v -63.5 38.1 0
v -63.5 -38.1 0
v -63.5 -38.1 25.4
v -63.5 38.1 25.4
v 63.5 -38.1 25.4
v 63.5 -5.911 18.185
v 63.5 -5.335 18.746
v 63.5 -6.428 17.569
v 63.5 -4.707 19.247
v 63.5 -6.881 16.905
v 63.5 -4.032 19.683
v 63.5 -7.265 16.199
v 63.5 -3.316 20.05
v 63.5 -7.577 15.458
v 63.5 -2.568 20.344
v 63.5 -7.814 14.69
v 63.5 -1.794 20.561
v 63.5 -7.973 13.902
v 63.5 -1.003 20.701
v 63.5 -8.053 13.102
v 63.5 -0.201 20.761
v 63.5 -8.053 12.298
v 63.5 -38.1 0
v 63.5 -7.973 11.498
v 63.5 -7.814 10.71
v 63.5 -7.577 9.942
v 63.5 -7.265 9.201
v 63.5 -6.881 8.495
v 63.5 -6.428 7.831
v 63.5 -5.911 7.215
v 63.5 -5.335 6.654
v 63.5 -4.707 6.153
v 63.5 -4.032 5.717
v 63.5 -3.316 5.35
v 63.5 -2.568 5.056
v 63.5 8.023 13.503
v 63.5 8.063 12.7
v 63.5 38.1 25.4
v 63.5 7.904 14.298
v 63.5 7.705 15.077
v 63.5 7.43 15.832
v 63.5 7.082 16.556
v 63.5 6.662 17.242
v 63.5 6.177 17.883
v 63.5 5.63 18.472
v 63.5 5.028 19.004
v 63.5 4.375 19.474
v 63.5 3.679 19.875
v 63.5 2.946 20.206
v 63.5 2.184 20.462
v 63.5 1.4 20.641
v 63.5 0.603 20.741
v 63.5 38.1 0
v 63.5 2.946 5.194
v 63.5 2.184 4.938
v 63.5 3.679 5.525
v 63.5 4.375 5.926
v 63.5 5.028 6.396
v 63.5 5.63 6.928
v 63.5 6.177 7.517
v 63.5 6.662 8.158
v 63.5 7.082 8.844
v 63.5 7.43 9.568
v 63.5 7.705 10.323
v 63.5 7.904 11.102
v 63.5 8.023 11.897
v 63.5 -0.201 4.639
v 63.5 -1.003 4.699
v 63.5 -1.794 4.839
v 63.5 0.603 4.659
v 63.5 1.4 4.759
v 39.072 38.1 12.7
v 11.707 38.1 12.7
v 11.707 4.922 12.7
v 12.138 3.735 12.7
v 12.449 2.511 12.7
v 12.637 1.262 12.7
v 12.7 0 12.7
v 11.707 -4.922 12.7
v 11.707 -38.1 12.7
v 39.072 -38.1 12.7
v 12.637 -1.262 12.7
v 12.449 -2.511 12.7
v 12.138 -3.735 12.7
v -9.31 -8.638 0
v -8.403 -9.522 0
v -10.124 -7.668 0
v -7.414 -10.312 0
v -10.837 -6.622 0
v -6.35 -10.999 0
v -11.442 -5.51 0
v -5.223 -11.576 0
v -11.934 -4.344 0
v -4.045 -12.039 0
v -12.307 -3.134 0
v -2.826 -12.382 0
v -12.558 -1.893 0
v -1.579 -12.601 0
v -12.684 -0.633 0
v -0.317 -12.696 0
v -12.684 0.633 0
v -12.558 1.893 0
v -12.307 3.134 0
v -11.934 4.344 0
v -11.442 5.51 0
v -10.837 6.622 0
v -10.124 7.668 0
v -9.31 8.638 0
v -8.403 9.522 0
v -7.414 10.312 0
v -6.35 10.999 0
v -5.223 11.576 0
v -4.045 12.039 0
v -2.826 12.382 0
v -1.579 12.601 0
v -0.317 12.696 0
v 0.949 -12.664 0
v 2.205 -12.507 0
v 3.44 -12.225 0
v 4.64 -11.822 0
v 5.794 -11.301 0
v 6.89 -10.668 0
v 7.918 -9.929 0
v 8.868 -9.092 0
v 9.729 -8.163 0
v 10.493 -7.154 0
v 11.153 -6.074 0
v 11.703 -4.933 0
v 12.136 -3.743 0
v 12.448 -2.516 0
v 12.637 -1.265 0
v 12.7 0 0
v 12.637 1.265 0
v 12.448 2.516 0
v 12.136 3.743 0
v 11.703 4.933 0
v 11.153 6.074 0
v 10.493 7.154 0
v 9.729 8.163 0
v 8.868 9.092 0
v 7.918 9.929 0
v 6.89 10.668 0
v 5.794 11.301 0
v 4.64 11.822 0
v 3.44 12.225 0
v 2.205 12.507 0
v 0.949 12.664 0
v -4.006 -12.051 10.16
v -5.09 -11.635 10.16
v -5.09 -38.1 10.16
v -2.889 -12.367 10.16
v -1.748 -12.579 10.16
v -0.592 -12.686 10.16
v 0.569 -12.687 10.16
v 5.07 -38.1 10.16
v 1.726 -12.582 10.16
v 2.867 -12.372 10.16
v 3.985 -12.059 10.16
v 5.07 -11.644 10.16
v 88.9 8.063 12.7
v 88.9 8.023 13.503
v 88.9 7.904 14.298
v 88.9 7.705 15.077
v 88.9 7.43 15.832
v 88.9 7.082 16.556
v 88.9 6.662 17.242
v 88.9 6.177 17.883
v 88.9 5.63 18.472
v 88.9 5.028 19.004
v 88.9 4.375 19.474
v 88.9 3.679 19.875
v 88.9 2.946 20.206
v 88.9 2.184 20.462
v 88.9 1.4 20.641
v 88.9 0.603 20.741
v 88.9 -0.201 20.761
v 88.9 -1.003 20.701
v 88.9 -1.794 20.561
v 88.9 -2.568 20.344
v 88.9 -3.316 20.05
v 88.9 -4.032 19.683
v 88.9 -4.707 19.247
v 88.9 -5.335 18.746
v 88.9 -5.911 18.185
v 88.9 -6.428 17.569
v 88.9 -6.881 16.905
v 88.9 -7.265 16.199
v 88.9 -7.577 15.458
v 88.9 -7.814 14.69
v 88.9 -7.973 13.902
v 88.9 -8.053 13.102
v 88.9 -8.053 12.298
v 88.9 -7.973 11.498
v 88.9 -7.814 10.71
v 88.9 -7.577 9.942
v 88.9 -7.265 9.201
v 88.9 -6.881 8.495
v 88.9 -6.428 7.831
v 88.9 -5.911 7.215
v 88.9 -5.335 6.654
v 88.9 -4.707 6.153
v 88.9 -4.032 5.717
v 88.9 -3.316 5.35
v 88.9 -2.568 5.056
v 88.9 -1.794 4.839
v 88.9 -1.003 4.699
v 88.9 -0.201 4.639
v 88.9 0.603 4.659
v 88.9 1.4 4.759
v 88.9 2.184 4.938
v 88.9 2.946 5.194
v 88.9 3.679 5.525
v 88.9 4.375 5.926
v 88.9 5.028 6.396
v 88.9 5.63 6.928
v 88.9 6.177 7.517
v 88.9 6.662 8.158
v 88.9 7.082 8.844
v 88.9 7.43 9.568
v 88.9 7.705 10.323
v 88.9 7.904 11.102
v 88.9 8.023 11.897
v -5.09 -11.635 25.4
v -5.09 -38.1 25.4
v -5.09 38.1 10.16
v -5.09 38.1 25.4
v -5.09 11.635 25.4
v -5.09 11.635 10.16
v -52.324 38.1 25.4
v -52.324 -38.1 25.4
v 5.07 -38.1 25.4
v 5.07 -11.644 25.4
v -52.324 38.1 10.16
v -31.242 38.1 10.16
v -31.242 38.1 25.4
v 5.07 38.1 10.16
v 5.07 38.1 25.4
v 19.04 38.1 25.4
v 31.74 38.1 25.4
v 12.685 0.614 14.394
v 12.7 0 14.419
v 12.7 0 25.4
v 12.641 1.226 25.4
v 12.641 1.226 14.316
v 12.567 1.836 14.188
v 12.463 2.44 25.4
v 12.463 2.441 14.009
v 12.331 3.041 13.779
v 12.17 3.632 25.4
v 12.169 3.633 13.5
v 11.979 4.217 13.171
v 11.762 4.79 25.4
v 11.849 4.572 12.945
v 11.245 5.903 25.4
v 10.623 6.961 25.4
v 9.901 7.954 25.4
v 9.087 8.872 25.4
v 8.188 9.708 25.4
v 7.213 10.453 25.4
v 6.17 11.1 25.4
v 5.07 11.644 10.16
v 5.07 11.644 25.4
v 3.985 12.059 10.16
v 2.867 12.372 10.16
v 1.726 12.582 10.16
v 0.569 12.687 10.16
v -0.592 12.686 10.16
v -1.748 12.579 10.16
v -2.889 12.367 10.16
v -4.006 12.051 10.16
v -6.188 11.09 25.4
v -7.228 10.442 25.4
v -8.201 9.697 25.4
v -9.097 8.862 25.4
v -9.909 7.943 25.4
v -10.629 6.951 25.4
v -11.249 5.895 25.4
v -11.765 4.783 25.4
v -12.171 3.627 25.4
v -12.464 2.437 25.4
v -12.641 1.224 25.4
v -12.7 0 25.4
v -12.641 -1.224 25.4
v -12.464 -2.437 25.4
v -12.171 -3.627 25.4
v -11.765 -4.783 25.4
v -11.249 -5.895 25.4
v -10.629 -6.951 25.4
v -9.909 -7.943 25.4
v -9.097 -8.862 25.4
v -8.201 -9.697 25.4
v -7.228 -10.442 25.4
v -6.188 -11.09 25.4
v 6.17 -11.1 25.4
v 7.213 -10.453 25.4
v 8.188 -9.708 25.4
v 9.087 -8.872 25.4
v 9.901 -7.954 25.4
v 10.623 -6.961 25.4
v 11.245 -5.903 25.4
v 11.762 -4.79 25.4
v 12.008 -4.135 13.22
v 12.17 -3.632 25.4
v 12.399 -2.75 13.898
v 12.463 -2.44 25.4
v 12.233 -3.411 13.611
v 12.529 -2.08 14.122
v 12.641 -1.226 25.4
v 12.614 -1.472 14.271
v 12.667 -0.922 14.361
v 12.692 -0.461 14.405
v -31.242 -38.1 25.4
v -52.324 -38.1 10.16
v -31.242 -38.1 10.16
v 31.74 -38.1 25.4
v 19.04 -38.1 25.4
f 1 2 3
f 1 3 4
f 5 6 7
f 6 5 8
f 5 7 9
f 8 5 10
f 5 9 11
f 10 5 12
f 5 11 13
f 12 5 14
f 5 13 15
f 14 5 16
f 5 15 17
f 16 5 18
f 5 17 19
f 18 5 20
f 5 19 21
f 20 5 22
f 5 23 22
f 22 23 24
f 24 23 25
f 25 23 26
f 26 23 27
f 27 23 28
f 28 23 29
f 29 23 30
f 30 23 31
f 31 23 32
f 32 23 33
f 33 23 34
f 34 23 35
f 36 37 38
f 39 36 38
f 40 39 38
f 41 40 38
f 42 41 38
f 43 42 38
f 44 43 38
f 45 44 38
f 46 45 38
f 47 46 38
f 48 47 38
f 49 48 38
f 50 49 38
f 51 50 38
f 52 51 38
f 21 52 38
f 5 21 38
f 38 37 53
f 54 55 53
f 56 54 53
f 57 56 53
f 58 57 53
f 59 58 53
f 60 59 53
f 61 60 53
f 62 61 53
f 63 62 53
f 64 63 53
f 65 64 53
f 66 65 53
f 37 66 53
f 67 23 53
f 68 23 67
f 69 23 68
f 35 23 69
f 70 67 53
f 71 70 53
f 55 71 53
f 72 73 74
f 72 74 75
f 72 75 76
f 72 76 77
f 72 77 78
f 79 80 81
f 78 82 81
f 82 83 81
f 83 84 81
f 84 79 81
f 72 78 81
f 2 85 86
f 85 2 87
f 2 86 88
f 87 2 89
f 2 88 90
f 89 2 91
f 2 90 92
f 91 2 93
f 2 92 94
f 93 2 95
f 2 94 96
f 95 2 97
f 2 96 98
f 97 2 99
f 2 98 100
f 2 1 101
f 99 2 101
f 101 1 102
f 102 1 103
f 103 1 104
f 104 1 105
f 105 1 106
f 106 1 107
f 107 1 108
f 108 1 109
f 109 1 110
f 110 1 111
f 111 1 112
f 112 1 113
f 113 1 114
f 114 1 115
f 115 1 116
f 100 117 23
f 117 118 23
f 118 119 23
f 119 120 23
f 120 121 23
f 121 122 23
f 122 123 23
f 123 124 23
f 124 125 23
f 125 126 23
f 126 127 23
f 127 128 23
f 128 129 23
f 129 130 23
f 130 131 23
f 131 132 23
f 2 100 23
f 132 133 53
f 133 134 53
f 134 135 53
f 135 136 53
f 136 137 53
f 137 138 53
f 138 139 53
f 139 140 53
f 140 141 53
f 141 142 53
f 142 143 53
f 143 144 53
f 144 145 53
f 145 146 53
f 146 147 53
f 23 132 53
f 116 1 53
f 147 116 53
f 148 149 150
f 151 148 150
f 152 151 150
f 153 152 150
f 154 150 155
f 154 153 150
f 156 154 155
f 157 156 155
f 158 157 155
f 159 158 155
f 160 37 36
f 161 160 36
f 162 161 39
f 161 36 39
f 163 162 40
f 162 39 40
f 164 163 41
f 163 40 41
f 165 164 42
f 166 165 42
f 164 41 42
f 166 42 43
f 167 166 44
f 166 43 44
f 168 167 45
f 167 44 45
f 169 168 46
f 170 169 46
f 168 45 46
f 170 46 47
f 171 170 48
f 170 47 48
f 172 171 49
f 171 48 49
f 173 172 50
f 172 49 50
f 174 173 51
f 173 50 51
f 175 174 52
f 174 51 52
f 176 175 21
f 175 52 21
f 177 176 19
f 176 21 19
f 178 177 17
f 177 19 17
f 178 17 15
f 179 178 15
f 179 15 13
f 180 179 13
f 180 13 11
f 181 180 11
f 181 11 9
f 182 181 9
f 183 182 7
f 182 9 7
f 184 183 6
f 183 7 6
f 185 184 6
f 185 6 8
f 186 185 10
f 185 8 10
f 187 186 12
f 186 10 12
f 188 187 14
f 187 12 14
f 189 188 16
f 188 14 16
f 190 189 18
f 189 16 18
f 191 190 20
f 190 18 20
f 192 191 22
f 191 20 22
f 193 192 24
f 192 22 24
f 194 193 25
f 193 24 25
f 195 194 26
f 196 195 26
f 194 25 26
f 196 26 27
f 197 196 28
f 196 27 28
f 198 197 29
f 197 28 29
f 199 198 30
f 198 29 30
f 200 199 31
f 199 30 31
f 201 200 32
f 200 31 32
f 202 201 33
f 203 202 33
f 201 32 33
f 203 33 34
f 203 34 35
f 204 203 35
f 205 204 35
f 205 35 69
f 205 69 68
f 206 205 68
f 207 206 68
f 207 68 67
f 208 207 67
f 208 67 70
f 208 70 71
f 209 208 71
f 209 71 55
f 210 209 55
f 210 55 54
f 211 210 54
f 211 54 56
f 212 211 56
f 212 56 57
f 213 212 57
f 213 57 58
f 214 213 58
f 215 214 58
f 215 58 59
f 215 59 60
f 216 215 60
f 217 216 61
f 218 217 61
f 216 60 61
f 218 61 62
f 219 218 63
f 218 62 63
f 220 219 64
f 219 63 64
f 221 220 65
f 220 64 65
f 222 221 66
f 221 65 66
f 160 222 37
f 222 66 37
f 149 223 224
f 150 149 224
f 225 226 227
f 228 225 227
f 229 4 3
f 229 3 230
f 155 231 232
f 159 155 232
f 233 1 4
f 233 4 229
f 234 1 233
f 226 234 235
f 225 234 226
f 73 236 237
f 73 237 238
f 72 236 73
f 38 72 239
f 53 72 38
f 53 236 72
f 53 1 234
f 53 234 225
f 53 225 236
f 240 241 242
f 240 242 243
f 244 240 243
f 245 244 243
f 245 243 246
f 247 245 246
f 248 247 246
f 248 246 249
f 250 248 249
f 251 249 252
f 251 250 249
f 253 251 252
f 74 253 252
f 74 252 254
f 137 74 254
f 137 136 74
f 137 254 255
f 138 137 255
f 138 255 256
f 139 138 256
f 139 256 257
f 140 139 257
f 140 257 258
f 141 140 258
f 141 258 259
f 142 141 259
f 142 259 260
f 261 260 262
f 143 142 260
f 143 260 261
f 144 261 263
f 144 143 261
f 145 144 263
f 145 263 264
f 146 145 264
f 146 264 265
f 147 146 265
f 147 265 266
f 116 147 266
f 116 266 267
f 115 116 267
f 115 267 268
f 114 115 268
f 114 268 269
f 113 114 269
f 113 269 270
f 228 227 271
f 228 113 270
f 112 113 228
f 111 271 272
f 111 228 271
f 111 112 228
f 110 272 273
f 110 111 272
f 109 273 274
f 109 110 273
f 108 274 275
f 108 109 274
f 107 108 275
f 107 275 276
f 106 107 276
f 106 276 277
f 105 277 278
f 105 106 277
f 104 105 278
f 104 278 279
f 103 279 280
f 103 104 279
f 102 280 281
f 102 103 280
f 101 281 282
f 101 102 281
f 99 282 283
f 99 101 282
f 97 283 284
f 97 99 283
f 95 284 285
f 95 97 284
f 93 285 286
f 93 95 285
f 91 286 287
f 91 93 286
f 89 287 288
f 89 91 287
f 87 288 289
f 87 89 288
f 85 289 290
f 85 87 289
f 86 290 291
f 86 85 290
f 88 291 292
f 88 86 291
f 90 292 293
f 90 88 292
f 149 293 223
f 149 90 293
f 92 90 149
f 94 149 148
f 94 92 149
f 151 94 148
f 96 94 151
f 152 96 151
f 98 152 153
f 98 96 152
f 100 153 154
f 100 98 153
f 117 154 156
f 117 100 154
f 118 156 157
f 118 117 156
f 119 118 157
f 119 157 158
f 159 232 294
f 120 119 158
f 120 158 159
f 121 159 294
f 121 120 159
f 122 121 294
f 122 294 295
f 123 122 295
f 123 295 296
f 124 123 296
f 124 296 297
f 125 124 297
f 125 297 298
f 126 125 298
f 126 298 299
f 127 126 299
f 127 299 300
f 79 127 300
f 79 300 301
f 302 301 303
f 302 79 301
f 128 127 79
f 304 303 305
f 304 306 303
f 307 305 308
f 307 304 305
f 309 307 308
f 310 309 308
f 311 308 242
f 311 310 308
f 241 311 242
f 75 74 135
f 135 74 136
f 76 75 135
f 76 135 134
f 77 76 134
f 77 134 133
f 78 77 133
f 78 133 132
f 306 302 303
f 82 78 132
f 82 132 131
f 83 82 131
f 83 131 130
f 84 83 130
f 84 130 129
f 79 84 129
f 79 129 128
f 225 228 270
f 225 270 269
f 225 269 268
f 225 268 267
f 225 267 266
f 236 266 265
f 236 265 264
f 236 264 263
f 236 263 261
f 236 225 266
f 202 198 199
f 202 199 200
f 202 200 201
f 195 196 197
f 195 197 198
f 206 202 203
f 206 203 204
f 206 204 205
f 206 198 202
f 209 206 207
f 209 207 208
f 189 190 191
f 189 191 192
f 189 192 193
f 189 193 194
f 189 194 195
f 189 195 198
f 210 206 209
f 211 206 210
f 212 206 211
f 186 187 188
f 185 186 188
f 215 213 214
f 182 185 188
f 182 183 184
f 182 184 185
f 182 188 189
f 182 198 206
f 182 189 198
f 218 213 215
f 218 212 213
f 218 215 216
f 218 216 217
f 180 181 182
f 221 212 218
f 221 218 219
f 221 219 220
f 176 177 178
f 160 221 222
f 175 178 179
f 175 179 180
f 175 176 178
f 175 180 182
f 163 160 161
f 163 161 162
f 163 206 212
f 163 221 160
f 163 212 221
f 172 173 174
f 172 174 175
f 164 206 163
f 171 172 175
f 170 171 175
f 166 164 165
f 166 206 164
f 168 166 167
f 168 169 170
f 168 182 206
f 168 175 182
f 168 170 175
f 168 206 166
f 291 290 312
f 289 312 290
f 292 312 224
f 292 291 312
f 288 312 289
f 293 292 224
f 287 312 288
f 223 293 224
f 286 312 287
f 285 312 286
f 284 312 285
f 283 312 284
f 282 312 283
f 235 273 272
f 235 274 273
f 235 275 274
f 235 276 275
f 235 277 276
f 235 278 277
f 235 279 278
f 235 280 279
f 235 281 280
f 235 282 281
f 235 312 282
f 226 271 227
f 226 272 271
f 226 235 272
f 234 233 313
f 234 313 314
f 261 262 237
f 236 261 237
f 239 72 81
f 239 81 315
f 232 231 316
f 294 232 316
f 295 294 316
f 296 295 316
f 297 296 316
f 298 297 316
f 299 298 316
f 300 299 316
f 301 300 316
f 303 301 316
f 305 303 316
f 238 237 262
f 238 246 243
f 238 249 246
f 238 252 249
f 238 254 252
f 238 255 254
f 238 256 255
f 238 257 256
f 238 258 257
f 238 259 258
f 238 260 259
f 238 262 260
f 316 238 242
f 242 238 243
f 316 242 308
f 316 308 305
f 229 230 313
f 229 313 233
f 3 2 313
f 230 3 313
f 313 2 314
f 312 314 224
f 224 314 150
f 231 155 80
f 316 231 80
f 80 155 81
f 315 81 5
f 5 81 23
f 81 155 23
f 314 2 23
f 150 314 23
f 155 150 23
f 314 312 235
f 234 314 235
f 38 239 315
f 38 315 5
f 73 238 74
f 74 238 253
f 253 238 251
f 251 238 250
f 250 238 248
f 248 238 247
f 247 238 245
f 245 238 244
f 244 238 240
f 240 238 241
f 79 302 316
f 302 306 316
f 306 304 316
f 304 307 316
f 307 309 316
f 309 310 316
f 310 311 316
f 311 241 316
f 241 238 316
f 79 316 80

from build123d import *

# Parameters (mm, degrees)
F1_W     = 127
F1_H     = 76.2
F1_R     = 12.7
F2_DEPTH = 25.4
F3_W     = 21.082
F3_H     = 76.2
F4_DEPTH = 15.24
F6_DEPTH = 76.201
F7_R     = 8.0634907525
F8_DEPTH = 25.4


with BuildPart() as f2:
    # F1 (on face) → F2 (new body)
    with BuildSketch(Plane.XY):
        Rectangle(F1_W, F1_H)
        Circle(F1_R, mode=Mode.SUBTRACT)
    extrude(amount=F2_DEPTH)

    # F3 (on face) → F4 (cut)
    with BuildSketch(Plane.XY.offset(25.4)):
        with Locations((-41.783, 0)):
            Rectangle(F3_W, F3_H)
        with BuildLine():
            Line((5.0697553696, 38.1), (-5.0902446304, 38.1))
            Line((-5.0902446304, 38.1), (-5.0902446304, 11.6352657728))
            ThreePointArc((-5.0902446304, 11.6352657728), (-0.0111778089, 12.699995081), (5.0697553696, 11.6442080234))
            Line((5.0697553696, 11.6442080234), (5.0697553696, 38.1))
        make_face()
        with BuildLine():
            Line((-5.0902446304, -11.6352657728), (-5.0902446304, -38.1))
            Line((-5.0902446304, -38.1), (5.0697553696, -38.1))
            Line((5.0697553696, -38.1), (5.0697553696, -11.6442080234))
            ThreePointArc((5.0697553696, -11.6442080234), (-0.0111778089, -12.699995081), (-5.0902446304, -11.6352657728))
        make_face()
    extrude(amount=-F4_DEPTH, mode=Mode.SUBTRACT)

    # F5 (on face) → F6 (cut, through all)
    with BuildSketch(Plane.XZ.offset(38.1)):
        Polygon((31.7397553696, 25.4), (19.0397553696, 25.4), (11.7074069509, 12.7), (39.0721037883, 12.7), align=None)
    extrude(amount=-F6_DEPTH, mode=Mode.SUBTRACT)

    # F7 (on face) → F8 (join)
    with BuildSketch(Plane.YZ.offset(63.5)):
        with Locations((0, 12.7)):
            Circle(F7_R)
    extrude(amount=F8_DEPTH)


solid = f2.part
